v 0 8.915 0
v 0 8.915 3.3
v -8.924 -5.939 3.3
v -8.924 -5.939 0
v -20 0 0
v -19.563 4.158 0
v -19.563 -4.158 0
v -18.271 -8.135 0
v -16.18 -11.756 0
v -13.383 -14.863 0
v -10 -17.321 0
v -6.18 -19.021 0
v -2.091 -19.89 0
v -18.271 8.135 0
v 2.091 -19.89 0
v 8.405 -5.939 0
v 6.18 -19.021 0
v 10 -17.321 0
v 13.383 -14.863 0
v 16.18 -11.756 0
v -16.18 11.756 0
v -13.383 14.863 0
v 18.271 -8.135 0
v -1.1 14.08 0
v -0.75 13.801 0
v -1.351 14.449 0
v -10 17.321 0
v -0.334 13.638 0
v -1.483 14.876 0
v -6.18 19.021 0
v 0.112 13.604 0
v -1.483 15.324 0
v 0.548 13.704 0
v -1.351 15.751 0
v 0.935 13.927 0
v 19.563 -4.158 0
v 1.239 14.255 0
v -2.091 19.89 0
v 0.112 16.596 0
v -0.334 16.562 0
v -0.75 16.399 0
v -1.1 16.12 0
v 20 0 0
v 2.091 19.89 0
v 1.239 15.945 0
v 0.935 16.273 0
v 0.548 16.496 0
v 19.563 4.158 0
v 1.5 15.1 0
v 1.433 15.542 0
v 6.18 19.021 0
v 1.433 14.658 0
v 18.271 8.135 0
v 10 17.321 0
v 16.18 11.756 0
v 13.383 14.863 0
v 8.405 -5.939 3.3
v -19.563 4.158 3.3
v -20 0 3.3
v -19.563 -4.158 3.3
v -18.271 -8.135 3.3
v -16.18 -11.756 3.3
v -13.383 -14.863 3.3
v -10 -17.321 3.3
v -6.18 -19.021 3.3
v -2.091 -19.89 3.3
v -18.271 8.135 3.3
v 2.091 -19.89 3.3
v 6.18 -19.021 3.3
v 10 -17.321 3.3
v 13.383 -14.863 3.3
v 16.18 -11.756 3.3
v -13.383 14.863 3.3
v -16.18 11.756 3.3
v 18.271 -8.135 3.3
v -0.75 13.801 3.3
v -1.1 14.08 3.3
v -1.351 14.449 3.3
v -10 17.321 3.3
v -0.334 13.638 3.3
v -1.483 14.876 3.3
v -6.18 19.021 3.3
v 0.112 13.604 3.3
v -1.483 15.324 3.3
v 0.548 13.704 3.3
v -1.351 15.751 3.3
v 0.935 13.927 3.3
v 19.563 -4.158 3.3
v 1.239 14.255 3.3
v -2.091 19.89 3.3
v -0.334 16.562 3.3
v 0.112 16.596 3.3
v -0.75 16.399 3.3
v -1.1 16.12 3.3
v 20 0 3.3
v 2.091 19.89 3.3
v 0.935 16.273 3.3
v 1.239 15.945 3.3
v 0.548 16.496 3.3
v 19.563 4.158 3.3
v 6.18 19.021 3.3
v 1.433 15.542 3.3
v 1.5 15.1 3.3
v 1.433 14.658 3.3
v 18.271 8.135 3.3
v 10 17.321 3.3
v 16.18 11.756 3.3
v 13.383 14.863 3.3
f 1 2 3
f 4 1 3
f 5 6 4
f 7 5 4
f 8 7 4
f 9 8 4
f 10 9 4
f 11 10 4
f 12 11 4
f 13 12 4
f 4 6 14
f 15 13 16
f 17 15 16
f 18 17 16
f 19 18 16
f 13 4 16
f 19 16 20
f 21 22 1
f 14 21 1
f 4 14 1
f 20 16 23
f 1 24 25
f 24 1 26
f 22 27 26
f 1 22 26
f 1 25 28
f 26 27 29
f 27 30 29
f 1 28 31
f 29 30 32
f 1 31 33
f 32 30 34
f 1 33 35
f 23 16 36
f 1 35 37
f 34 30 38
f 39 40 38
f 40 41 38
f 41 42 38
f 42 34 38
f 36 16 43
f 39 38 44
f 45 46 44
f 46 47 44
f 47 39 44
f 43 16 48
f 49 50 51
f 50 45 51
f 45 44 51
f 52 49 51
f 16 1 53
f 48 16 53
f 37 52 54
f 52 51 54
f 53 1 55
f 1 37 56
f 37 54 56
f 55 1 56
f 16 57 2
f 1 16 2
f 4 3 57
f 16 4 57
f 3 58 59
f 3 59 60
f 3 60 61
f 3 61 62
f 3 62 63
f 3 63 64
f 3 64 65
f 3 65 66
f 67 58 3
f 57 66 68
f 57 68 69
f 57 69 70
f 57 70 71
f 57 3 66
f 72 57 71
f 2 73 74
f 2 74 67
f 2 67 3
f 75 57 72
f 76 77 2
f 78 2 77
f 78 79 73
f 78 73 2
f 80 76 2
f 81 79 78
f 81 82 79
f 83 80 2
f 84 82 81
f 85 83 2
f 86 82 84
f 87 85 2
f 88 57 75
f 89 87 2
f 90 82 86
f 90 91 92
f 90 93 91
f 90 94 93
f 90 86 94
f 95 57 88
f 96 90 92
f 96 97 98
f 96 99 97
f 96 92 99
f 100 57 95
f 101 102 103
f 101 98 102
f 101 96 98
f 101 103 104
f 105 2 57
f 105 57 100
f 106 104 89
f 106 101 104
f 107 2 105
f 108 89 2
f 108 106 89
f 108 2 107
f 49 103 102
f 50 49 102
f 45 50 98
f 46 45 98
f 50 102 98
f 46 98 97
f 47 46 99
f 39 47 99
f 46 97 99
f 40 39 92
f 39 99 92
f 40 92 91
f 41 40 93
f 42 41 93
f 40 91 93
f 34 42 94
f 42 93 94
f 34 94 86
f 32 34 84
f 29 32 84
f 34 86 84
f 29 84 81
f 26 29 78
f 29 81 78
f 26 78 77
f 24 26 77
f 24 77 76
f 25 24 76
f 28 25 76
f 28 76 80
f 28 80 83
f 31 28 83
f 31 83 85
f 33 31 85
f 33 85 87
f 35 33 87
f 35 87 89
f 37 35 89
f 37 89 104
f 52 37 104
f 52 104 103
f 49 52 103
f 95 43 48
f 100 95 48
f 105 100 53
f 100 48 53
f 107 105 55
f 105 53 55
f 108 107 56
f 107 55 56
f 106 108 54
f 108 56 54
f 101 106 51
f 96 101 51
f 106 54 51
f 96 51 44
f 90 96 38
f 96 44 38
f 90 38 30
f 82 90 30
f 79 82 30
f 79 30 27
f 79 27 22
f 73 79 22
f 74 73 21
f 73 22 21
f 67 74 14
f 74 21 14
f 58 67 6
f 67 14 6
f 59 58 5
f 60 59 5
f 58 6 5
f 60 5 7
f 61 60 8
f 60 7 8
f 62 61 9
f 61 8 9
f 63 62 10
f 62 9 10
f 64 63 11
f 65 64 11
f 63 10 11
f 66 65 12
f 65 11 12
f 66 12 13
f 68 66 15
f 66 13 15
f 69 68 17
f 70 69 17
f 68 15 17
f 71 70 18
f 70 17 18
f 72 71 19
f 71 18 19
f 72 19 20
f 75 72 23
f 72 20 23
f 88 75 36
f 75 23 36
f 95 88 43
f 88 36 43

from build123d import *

# Parameters (mm, degrees)
CYLINDER_R      = 20
CYLINDER_DEPTH  = 3.3
SKETCH_R        = 1.5
POCKET_DEPTH    = 3.301
POCKET001_DEPTH = 3.301


with BuildPart() as part:
    # Cylinder → Cylinder (new body)
    with BuildSketch(Plane.XY):
        Circle(CYLINDER_R)
    extrude(amount=CYLINDER_DEPTH)

    # Sketch → Pocket (cut, through all)
    with BuildSketch(Plane.XY.offset(3.3)):
        with Locations((0, 15.1)):
            Circle(SKETCH_R)
    extrude(amount=-POCKET_DEPTH, mode=Mode.SUBTRACT)

    # Sketch001 → Pocket001 (cut, through all)
    with BuildSketch(Plane.XY.offset(3.3)):
        Polygon((0, 8.915402), (-8.923643, -5.938961), (8.405048, -5.938961), align=None)
    extrude(amount=-POCKET001_DEPTH, mode=Mode.SUBTRACT)


solid = part.part
